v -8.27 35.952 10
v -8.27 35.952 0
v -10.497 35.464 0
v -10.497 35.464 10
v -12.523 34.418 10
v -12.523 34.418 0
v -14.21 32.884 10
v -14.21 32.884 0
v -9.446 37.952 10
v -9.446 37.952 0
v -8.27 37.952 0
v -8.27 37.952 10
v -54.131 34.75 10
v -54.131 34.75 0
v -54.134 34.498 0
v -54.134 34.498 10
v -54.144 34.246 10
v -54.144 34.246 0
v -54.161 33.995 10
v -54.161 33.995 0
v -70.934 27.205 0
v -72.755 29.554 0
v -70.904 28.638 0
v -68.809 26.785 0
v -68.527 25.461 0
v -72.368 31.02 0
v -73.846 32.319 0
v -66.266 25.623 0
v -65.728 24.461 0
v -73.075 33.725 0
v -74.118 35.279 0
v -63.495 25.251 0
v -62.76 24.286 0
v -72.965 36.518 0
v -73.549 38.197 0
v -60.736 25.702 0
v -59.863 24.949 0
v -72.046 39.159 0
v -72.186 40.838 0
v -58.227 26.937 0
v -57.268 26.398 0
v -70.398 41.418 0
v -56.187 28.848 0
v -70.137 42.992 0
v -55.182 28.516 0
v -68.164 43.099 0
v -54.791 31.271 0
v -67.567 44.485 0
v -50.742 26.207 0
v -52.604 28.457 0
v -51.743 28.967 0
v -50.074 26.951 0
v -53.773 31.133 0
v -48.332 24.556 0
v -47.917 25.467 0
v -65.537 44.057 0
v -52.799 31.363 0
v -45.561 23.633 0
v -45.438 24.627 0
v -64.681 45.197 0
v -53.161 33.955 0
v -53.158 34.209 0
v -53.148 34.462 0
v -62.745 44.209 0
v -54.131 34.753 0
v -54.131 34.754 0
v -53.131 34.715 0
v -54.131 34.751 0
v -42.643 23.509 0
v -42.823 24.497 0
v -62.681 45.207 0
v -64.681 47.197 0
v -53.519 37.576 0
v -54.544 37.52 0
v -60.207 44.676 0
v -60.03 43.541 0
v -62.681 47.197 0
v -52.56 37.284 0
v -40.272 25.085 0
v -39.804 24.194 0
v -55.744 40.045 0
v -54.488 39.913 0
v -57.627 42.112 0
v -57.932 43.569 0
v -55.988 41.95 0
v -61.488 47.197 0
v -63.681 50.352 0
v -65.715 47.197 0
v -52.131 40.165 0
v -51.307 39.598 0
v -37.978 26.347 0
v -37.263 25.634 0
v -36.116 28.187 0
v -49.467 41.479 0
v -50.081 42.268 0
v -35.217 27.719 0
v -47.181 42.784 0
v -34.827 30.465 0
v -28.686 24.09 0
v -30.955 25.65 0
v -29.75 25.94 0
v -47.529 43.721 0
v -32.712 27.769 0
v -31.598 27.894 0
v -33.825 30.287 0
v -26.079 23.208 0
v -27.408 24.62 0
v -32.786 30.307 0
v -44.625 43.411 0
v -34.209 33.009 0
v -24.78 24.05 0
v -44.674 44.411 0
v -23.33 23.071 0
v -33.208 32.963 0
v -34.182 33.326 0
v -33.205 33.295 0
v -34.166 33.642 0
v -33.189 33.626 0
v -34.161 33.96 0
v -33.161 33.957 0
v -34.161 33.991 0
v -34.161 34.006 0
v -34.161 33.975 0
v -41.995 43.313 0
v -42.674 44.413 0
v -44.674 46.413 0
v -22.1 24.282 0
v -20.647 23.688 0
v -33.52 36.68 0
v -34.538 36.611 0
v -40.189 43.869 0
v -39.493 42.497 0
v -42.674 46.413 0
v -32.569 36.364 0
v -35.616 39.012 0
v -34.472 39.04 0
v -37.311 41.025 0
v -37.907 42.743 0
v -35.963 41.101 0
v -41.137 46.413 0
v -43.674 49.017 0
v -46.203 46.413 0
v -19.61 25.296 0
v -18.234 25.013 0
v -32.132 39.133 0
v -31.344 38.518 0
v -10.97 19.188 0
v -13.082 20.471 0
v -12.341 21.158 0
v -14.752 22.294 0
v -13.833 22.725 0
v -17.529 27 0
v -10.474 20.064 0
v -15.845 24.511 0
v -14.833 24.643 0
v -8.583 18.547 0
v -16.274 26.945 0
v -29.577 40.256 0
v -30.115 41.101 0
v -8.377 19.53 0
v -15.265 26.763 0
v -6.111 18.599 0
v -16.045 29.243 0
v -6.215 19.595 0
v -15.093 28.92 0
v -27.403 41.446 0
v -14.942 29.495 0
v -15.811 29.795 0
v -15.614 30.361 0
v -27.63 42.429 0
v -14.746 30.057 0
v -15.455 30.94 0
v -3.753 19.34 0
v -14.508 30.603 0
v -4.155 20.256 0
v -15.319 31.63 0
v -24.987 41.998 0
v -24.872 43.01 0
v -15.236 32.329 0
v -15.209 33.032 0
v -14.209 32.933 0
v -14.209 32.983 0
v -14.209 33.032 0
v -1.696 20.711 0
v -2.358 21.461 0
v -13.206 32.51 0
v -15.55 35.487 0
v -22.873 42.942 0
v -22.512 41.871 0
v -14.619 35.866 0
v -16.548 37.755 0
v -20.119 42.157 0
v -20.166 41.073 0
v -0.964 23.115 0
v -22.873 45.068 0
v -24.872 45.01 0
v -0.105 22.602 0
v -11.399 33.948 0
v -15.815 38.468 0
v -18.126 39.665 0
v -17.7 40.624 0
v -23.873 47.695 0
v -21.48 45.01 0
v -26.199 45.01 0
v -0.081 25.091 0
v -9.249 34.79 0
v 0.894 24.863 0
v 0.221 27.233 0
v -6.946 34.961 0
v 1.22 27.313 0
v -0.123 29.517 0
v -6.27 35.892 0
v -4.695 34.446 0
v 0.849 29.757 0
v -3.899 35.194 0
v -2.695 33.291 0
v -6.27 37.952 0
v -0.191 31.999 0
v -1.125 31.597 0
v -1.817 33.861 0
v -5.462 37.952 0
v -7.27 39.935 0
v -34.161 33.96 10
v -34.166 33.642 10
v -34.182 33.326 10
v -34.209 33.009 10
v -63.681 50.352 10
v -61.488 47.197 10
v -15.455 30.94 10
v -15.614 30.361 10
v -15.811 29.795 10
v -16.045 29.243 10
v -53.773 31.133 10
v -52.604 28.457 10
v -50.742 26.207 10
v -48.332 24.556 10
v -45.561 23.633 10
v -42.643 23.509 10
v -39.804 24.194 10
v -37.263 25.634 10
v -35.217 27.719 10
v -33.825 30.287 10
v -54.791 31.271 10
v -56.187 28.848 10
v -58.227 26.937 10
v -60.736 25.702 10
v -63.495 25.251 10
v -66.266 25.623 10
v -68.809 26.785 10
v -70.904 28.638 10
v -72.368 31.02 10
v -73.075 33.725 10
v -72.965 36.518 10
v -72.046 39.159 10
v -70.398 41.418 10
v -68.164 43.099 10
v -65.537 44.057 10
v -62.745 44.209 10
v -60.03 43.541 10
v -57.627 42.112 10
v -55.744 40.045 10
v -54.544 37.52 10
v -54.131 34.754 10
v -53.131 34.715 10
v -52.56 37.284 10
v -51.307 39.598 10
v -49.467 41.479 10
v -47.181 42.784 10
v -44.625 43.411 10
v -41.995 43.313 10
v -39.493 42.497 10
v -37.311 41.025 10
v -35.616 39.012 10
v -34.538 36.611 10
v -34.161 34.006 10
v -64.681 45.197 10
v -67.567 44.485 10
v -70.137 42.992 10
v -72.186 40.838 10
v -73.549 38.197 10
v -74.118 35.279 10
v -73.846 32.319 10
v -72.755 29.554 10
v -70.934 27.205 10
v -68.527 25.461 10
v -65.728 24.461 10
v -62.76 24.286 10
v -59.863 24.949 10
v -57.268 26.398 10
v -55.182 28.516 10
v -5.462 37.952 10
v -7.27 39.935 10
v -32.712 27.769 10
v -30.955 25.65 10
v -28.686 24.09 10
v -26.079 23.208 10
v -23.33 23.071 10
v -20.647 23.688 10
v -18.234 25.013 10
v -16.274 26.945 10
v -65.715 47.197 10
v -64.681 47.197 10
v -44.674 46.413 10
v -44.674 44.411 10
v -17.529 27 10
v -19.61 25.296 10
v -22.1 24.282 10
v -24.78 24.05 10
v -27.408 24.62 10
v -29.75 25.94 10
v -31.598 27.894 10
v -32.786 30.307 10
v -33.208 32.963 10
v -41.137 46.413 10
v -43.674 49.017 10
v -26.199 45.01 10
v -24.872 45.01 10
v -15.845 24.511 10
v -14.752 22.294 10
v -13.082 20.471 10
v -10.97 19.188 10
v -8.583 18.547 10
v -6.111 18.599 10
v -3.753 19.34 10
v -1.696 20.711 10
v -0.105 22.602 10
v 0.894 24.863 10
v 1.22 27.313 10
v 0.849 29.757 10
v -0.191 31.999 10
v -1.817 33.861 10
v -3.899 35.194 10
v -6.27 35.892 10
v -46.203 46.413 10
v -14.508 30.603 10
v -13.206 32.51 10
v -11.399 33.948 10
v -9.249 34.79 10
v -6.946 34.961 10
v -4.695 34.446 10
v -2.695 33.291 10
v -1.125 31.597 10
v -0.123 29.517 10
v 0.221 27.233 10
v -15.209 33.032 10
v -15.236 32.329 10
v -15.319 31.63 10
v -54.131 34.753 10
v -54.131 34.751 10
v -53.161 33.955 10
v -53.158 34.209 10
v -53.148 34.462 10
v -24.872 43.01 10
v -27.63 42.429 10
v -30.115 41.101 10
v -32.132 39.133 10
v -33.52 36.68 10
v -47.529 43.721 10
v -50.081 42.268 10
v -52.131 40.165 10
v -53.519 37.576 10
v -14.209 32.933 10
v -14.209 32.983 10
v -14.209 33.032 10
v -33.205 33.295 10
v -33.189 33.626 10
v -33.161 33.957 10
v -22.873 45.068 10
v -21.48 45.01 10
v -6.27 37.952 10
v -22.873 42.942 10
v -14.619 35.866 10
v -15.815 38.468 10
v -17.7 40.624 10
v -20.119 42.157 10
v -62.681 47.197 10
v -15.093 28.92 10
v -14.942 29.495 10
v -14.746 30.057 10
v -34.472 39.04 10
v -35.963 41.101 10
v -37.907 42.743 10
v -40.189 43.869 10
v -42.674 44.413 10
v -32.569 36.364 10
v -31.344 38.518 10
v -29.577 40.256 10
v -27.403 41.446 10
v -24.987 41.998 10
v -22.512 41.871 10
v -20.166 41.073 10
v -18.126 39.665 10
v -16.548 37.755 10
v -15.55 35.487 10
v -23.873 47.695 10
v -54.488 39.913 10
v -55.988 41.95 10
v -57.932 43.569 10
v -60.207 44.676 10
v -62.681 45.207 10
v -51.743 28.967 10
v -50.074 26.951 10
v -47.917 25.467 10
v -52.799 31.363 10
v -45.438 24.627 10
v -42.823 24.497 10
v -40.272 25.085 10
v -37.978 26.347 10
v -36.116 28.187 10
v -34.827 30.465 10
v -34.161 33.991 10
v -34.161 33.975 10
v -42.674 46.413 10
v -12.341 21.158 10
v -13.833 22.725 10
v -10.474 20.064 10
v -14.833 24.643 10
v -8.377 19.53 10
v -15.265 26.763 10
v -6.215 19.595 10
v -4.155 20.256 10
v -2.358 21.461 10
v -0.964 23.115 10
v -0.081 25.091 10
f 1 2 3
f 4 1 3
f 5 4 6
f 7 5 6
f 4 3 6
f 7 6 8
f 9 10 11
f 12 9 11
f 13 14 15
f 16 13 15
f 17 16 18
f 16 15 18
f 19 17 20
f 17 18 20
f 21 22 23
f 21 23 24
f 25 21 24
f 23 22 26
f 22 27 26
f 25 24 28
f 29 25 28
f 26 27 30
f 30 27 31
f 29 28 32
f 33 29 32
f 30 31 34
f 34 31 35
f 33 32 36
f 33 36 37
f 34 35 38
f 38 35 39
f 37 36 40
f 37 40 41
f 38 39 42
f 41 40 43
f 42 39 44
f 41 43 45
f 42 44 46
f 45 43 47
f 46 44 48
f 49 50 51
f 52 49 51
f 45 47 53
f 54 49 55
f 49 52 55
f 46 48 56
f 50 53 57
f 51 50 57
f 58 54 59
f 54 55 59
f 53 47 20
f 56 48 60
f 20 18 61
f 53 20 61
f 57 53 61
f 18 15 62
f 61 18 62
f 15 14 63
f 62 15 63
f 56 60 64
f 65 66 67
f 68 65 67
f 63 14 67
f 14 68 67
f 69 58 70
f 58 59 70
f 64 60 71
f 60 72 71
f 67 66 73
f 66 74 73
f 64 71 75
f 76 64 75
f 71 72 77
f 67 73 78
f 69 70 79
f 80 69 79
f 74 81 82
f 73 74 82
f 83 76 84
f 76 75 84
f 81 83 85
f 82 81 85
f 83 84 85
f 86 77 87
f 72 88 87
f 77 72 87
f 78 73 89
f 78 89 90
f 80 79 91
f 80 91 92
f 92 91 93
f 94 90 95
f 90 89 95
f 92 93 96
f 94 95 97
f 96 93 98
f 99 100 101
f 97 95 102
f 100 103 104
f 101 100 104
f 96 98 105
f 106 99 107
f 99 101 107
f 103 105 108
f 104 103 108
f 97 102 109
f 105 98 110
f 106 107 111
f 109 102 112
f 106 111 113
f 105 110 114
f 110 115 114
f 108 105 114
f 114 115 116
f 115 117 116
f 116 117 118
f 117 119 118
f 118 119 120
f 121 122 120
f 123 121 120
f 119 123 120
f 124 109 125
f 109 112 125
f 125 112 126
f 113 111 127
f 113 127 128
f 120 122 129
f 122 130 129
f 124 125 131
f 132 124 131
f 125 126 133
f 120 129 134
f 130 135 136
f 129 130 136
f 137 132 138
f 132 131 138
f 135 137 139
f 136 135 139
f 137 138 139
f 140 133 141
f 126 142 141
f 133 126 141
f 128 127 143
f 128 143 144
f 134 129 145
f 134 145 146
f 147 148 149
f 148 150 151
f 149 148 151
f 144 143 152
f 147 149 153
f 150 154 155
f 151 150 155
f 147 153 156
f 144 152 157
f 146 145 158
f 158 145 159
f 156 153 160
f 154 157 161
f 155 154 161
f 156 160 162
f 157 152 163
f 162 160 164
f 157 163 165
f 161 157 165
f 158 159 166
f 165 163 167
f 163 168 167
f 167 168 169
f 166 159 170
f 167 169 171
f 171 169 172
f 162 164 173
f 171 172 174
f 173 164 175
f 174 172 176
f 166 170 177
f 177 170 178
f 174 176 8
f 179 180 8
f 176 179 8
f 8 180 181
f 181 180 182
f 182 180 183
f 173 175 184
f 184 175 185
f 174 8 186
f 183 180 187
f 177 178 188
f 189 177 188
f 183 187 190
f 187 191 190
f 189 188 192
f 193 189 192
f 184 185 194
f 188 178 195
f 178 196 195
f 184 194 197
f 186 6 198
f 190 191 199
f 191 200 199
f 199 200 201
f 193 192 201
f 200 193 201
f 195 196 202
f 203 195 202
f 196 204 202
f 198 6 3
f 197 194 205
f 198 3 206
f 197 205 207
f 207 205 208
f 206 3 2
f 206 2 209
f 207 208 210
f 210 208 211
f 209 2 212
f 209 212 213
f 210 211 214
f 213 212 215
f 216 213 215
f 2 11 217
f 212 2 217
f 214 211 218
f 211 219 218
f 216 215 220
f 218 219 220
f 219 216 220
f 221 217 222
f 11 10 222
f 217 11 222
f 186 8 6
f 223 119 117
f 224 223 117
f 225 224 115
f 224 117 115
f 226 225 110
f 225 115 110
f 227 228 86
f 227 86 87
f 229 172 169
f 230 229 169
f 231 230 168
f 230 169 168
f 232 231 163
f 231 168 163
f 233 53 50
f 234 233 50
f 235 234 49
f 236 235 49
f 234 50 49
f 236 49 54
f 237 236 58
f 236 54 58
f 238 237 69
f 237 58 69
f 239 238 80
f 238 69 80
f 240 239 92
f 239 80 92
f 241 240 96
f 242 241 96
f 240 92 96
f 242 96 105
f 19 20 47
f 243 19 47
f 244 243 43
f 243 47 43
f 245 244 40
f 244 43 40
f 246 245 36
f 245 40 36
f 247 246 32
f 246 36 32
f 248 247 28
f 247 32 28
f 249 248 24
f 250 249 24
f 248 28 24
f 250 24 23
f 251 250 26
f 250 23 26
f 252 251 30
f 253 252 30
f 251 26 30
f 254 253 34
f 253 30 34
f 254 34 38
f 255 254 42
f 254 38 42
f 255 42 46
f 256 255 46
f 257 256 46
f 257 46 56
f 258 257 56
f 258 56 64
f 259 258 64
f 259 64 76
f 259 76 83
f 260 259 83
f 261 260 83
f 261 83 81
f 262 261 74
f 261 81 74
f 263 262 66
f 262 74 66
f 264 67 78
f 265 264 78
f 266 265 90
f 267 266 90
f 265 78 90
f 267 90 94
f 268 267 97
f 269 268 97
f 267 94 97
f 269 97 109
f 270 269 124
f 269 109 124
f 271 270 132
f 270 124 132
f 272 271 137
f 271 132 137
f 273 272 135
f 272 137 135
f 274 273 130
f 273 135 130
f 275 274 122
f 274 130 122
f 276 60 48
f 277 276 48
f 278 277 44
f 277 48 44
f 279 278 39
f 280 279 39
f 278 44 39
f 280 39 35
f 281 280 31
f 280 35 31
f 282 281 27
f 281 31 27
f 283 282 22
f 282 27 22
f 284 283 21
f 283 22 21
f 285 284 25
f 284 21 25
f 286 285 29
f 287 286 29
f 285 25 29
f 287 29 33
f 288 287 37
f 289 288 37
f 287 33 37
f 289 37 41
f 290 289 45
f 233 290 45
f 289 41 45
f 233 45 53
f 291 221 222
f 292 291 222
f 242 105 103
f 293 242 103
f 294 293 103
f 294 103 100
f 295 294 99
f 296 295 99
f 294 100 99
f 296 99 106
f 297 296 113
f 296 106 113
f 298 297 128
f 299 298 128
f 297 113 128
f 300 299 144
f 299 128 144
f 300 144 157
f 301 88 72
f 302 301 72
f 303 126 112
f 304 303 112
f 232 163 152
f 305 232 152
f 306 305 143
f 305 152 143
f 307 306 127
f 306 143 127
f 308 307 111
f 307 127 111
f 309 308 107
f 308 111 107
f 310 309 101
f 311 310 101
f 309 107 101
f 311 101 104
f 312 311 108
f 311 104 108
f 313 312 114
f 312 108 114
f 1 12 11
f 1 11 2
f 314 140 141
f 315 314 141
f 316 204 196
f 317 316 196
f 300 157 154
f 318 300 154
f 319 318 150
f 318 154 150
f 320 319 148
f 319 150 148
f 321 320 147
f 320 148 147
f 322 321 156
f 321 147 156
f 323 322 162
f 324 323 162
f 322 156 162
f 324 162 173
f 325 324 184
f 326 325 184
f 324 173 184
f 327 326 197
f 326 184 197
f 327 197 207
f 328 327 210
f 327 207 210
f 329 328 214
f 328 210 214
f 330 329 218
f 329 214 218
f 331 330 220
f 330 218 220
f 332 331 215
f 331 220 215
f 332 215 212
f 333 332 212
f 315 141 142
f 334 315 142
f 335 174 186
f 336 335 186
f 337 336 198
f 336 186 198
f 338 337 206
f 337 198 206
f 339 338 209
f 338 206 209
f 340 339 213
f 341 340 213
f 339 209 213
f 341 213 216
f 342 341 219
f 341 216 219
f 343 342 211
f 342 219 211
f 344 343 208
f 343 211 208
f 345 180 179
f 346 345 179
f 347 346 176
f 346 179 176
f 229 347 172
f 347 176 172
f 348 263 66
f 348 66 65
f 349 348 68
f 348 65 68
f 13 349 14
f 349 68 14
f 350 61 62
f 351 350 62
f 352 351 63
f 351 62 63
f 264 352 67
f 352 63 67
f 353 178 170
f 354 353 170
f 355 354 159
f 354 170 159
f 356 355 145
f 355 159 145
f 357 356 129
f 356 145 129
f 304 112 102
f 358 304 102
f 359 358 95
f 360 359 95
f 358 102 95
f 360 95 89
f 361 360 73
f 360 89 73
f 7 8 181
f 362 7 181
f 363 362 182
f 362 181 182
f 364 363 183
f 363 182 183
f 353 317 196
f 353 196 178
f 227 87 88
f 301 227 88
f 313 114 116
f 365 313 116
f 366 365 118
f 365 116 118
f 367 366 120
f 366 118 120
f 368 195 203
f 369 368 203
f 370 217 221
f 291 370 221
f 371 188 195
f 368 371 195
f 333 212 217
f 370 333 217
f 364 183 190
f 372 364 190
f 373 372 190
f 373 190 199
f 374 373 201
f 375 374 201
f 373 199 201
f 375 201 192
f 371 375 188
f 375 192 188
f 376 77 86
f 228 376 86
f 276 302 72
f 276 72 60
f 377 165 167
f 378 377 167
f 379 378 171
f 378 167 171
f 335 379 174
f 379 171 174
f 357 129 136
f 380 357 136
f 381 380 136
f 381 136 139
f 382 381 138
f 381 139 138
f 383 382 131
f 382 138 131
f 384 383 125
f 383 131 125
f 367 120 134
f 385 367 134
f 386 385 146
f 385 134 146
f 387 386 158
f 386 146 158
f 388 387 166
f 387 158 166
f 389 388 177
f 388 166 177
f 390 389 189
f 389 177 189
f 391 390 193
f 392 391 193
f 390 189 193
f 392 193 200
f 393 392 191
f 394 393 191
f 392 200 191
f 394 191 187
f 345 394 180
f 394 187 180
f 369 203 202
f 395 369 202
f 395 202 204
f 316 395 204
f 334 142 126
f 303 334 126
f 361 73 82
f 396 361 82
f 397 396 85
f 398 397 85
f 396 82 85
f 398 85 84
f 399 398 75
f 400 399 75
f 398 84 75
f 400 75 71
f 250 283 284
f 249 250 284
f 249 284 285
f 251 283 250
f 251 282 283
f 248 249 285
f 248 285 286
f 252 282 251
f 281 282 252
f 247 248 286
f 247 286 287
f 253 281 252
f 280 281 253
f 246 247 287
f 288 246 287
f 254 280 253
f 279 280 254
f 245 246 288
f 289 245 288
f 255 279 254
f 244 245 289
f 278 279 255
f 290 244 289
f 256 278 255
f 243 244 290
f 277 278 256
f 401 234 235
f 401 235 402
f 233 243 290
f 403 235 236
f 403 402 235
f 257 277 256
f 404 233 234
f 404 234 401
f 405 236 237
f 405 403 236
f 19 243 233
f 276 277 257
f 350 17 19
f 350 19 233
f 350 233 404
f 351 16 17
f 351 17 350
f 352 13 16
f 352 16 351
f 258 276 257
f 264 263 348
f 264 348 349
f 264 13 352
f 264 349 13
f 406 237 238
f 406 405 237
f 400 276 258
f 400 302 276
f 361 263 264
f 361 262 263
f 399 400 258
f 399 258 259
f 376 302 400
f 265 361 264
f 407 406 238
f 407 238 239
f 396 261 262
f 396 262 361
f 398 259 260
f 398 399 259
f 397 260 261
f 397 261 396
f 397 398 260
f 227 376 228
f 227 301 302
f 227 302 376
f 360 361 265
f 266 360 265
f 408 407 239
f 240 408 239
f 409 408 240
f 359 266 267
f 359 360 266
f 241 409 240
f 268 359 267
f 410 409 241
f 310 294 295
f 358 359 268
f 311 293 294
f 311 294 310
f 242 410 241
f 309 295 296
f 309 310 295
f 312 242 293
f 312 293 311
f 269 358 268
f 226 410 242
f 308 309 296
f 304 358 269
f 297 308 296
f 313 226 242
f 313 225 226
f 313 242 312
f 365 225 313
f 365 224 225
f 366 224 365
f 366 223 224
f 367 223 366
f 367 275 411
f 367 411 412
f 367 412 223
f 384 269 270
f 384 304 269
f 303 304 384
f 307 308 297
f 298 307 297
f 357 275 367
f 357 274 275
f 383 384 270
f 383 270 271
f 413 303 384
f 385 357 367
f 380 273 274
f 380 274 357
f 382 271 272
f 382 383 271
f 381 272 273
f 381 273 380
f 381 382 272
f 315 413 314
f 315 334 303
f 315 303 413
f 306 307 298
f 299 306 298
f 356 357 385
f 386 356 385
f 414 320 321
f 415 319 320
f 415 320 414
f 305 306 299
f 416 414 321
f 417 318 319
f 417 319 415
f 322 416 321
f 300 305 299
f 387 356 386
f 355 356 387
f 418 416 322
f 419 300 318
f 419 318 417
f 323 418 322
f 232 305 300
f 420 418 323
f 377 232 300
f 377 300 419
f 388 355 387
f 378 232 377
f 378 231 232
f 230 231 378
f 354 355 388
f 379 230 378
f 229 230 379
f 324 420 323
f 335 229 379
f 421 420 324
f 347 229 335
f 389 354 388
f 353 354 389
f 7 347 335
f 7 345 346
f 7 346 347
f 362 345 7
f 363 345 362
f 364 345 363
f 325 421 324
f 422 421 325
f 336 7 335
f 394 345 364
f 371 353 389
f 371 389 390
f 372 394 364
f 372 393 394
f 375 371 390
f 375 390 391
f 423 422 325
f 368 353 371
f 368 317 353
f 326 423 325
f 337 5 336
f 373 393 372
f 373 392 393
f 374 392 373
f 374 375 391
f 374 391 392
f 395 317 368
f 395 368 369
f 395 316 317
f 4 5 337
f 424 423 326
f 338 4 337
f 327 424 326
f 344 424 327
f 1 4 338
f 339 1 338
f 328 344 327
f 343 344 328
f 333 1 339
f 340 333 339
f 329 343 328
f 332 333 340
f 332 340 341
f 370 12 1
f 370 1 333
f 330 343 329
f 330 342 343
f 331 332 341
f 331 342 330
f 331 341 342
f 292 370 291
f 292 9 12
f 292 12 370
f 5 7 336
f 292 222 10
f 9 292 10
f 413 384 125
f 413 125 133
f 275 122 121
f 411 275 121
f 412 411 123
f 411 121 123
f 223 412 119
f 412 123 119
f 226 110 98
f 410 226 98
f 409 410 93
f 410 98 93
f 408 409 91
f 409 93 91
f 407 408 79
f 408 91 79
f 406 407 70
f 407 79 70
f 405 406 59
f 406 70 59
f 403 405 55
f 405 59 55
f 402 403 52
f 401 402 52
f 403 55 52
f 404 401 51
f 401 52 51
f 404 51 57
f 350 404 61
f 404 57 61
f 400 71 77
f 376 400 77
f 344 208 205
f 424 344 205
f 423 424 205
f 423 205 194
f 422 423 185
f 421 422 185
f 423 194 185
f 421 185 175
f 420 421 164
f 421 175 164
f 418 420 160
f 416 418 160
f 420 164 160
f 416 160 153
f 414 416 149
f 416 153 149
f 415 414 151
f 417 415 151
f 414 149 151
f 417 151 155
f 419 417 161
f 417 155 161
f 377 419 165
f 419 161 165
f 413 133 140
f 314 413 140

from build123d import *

# Parameters (mm, degrees)
F1_DEPTH = 10


with BuildPart() as f1:
    # F0 (on Top) → F1 (new body)
    with BuildSketch(Plane.XY):
        with BuildLine():
            ThreePointArc((-54.1309299153, 34.7543450507), (-54.1309291616, 34.7521602069), (-54.1309289103, 34.749975363))
            ThreePointArc((-54.1309289103, 34.749975363), (-54.1384443348, 34.3721704089), (-54.1609787174, 33.9949632158))
            ThreePointArc((-54.1609787174, 33.9949632158), (-54.0660685748, 32.5507467457), (-53.7734610387, 31.1333018692))
            ThreePointArc((-53.7734610387, 31.1333018692), (-53.3697669437, 32.5231940325), (-53.1610367081, 33.9553954277))
            ThreePointArc((-53.1610367081, 33.9553954277), (-53.1536089265, 34.335386944), (-53.130987906, 34.7147772626))
            ThreePointArc((-53.130987906, 34.7147772626), (-53.1309436593, 34.7323762881), (-53.1309289103, 34.749975363))
            ThreePointArc((-53.1309289103, 34.749975363), (-53.2282743232, 36.1764316505), (-53.5185055847, 37.5764386092))
            ThreePointArc((-53.5185055847, 37.5764386092), (-53.9221996797, 36.186546446), (-54.1309299153, 34.7543450507))
        make_face()
        with BuildLine():
            ThreePointArc((-54.1609787174, 33.9949632158), (-73.1235001238, 35.1255971916), (-54.1309299153, 34.7543450507))
            ThreePointArc((-54.1309299153, 34.7543450507), (-53.9221996797, 36.186546446), (-53.5185055847, 37.5764386092))
            ThreePointArc((-53.5185055847, 37.5764386092), (-56.911506833, 42.8183932343), (-62.6808702946, 45.2069055352))
            ThreePointArc((-62.6808702946, 45.2069055352), (-63.6810983438, 45.2498555065), (-64.6808702946, 45.1973493436))
            ThreePointArc((-64.6808702946, 45.1973493436), (-71.9280662809, 28.3151085071), (-53.7734610387, 31.1333018692))
            ThreePointArc((-53.7734610387, 31.1333018692), (-54.0660685748, 32.5507467457), (-54.1609787174, 33.9949632158))
        make_face()
        with BuildLine():
            ThreePointArc((-44.6742990635, 44.410760352), (-50.0813318555, 42.2681839255), (-53.5185055847, 37.5764386092))
            ThreePointArc((-53.5185055847, 37.5764386092), (-53.2282743232, 36.1764316505), (-53.1309289103, 34.749975363))
            ThreePointArc((-53.1309289103, 34.749975363), (-53.1309436593, 34.7323762881), (-53.130987906, 34.7147772626))
            ThreePointArc((-53.130987906, 34.7147772626), (-43.3064639701, 43.4531458336), (-34.1611515007, 34.0062619194))
            ThreePointArc((-34.1611515007, 34.0062619194), (-33.9326832198, 35.3653133694), (-33.5195358748, 36.6800482744))
            ThreePointArc((-33.5195358748, 36.6800482744), (-36.8853295304, 41.9809731681), (-42.6742990635, 44.4132978598))
            ThreePointArc((-42.6742990635, 44.4132978598), (-43.674359618, 44.4597566643), (-44.6742990635, 44.410760352))
        make_face()
        with BuildLine():
            ThreePointArc((-53.1610367081, 33.9553954277), (-53.3697669437, 32.5231940325), (-53.7734610387, 31.1333018692))
            ThreePointArc((-53.7734610387, 31.1333018692), (-44.1063222, 23.469211187), (-33.824501511, 30.2865437029))
            ThreePointArc((-33.824501511, 30.2865437029), (-34.1106339928, 31.63463376), (-34.2087077363, 33.0092610331))
            ThreePointArc((-34.2087077363, 33.0092610331), (-44.134704956, 24.4715809191), (-53.1610367081, 33.9553954277))
        make_face()
        with BuildLine():
            ThreePointArc((-64.6808702946, 45.1973493436), (-63.6810983438, 45.2498555065), (-62.6808702946, 45.2069055352))
            Line((-62.6808702946, 45.2069055352), (-62.6808702946, 47.1973493436))
            Line((-62.6808702946, 47.1973493436), (-64.6808702946, 47.1973493436))
            Line((-64.6808702946, 47.1973493436), (-64.6808702946, 45.1973493436))
        make_face()
        with BuildLine():
            Line((-44.6742990635, 46.4132978598), (-44.6742990635, 44.410760352))
            ThreePointArc((-44.6742990635, 44.410760352), (-43.674359618, 44.4597566643), (-42.6742990635, 44.4132978598))
            Line((-42.6742990635, 44.4132978598), (-42.6742990635, 46.4132978598))
            Line((-42.6742990635, 46.4132978598), (-44.6742990635, 46.4132978598))
        make_face()
        with BuildLine():
            ThreePointArc((-34.2087077363, 33.0092610331), (-34.1106339928, 31.63463376), (-33.824501511, 30.2865437029))
            ThreePointArc((-33.824501511, 30.2865437029), (-33.4286074238, 31.6044794904), (-33.2084686098, 32.962870366))
            ThreePointArc((-33.2084686098, 32.962870366), (-33.1985123089, 33.4607100698), (-33.1610380174, 33.9572371849))
            ThreePointArc((-33.1610380174, 33.9572371849), (-33.1610377891, 33.9585011501), (-33.1610377131, 33.9597651154))
            ThreePointArc((-33.1610377131, 33.9597651154), (-33.2510480564, 35.3316672071), (-33.5195358748, 36.6800482744))
            ThreePointArc((-33.5195358748, 36.6800482744), (-33.9326832198, 35.3653133694), (-34.1611515007, 34.0062619194))
            ThreePointArc((-34.1611515007, 34.0062619194), (-34.16106616, 33.983013587), (-34.1610377131, 33.9597651154))
            ThreePointArc((-34.1610377131, 33.9597651154), (-34.1729627034, 33.4839157586), (-34.2087077363, 33.0092610331))
        make_face()
        with BuildLine():
            ThreePointArc((-33.2084686098, 32.962870366), (-33.4286074238, 31.6044794904), (-33.824501511, 30.2865437029))
            ThreePointArc((-33.824501511, 30.2865437029), (-26.0789758688, 23.2083510142), (-16.2744258404, 26.9452986929))
            ThreePointArc((-16.2744258404, 26.9452986929), (-16.2359459807, 28.1016396023), (-16.0452382377, 29.242794962))
            ThreePointArc((-16.0452382377, 29.242794962), (-26.1151867885, 24.2361416337), (-33.2084686098, 32.962870366))
        make_face()
        Polygon((-64.6808702946, 47.1973493436), (-62.6808702946, 47.1973493436), (-61.4884868264, 47.1973493436), (-63.6808702946, 50.3516308963), (-65.7154172659, 47.1973493436), align=None)
        Polygon((-46.2027452886, 46.4132978598), (-44.6742990635, 46.4132978598), (-42.6742990635, 46.4132978598), (-41.1369259803, 46.4132978598), (-43.6742990635, 49.0165157606), align=None)
        with BuildLine():
            ThreePointArc((-16.0452382377, 29.242794962), (-16.2359459807, 28.1016396023), (-16.2744258404, 26.9452986929))
            ThreePointArc((-16.2744258404, 26.9452986929), (-15.6269720373, 27.8983504024), (-15.0934414581, 28.9195502405))
            ThreePointArc((-15.0934414581, 28.9195502405), (-14.849388288, 29.7780382301), (-14.5082524575, 30.6027745052))
            ThreePointArc((-14.5082524575, 30.6027745052), (-14.2932265185, 31.734705525), (-14.2098293285, 32.8838569062))
            ThreePointArc((-14.2098293285, 32.8838569062), (-14.8969732194, 31.9530302459), (-15.4552995863, 30.9396810138))
            ThreePointArc((-15.4552995863, 30.9396810138), (-15.7078230332, 30.0764812725), (-16.0452382377, 29.242794962))
        make_face()
        with BuildLine():
            ThreePointArc((-15.0934414581, 28.9195502405), (-15.6269720373, 27.8983504024), (-16.2744258404, 26.9452986929))
            ThreePointArc((-16.2744258404, 26.9452986929), (-7.3852443737, 18.4842744982), (1.2208400589, 27.2330908929))
            ThreePointArc((1.2208400589, 27.2330908929), (-0.9117259801, 32.9577802096), (-6.269918289, 35.8920059787))
            ThreePointArc((-6.269918289, 35.8920059787), (-7.268206978, 35.9791988017), (-8.269918289, 35.9516789134))
            ThreePointArc((-8.269918289, 35.9516789134), (-11.5444158949, 35.0074217082), (-14.2098293285, 32.8838569062))
            ThreePointArc((-14.2098293285, 32.8838569062), (-14.2932265185, 31.734705525), (-14.5082524575, 30.6027745052))
            ThreePointArc((-14.5082524575, 30.6027745052), (-5.8007888875, 34.7879061456), (0.2208400589, 27.2330908929))
            ThreePointArc((0.2208400589, 27.2330908929), (-8.3774871901, 19.5296604312), (-15.0934414581, 28.9195502405))
        make_face()
        with BuildLine():
            ThreePointArc((-24.8723683958, 43.0098591155), (-30.1154225727, 41.1010441317), (-33.5195358748, 36.6800482744))
            ThreePointArc((-33.5195358748, 36.6800482744), (-33.2510480564, 35.3316672071), (-33.1610377131, 33.9597651154))
            ThreePointArc((-33.1610377131, 33.9597651154), (-33.1610377891, 33.9585011501), (-33.1610380174, 33.9572371849))
            ThreePointArc((-33.1610380174, 33.9572371849), (-23.745452578, 42.0199722388), (-15.2087333715, 33.0319039866))
            ThreePointArc((-15.2087333715, 33.0319039866), (-15.2705874769, 31.9785531588), (-15.4552995863, 30.9396810138))
            ThreePointArc((-15.4552995863, 30.9396810138), (-14.8969732194, 31.9530302459), (-14.2098293285, 32.8838569062))
            ThreePointArc((-14.2098293285, 32.8838569062), (-14.2090073645, 32.9578784182), (-14.2087333715, 33.0319039866))
            ThreePointArc((-14.2087333715, 33.0319039866), (-16.6802799939, 39.6138785947), (-22.8732113197, 42.9423217805))
            ThreePointArc((-22.8732113197, 42.9423217805), (-23.8710969289, 43.0262024429), (-24.8723683958, 43.0098591155))
        make_face()
        with BuildLine():
            Line((-24.8723683958, 45.0098591155), (-24.8723683958, 43.0098591155))
            ThreePointArc((-24.8723683958, 43.0098591155), (-23.8710969289, 43.0262024429), (-22.8732113197, 42.9423217805))
            Line((-22.8732113197, 42.9423217805), (-22.8732113197, 45.0679193003))
            Line((-22.8732113197, 45.0679193003), (-24.8723683958, 45.0098591155))
        make_face()
        with BuildLine():
            ThreePointArc((-8.269918289, 35.9516789134), (-7.268206978, 35.9791988017), (-6.269918289, 35.8920059787))
            Line((-6.269918289, 35.8920059787), (-6.269918289, 37.9516789134))
            Line((-6.269918289, 37.9516789134), (-8.269918289, 37.9516789134))
            Line((-8.269918289, 37.9516789134), (-8.269918289, 35.9516789134))
        make_face()
        Polygon((-26.1985734105, 45.0098591155), (-24.8723683958, 45.0098591155), (-22.8732113197, 45.0679193003), (-21.4801449329, 45.0098591155), (-23.8727898577, 47.6949326694), align=None)
        Polygon((-8.269918289, 37.9516789134), (-6.269918289, 37.9516789134), (-5.4624893661, 37.9516789134), (-7.269918289, 39.9350486696), (-9.4463555142, 37.9516789134), align=None)
    extrude(amount=F1_DEPTH)


solid = f1.part
